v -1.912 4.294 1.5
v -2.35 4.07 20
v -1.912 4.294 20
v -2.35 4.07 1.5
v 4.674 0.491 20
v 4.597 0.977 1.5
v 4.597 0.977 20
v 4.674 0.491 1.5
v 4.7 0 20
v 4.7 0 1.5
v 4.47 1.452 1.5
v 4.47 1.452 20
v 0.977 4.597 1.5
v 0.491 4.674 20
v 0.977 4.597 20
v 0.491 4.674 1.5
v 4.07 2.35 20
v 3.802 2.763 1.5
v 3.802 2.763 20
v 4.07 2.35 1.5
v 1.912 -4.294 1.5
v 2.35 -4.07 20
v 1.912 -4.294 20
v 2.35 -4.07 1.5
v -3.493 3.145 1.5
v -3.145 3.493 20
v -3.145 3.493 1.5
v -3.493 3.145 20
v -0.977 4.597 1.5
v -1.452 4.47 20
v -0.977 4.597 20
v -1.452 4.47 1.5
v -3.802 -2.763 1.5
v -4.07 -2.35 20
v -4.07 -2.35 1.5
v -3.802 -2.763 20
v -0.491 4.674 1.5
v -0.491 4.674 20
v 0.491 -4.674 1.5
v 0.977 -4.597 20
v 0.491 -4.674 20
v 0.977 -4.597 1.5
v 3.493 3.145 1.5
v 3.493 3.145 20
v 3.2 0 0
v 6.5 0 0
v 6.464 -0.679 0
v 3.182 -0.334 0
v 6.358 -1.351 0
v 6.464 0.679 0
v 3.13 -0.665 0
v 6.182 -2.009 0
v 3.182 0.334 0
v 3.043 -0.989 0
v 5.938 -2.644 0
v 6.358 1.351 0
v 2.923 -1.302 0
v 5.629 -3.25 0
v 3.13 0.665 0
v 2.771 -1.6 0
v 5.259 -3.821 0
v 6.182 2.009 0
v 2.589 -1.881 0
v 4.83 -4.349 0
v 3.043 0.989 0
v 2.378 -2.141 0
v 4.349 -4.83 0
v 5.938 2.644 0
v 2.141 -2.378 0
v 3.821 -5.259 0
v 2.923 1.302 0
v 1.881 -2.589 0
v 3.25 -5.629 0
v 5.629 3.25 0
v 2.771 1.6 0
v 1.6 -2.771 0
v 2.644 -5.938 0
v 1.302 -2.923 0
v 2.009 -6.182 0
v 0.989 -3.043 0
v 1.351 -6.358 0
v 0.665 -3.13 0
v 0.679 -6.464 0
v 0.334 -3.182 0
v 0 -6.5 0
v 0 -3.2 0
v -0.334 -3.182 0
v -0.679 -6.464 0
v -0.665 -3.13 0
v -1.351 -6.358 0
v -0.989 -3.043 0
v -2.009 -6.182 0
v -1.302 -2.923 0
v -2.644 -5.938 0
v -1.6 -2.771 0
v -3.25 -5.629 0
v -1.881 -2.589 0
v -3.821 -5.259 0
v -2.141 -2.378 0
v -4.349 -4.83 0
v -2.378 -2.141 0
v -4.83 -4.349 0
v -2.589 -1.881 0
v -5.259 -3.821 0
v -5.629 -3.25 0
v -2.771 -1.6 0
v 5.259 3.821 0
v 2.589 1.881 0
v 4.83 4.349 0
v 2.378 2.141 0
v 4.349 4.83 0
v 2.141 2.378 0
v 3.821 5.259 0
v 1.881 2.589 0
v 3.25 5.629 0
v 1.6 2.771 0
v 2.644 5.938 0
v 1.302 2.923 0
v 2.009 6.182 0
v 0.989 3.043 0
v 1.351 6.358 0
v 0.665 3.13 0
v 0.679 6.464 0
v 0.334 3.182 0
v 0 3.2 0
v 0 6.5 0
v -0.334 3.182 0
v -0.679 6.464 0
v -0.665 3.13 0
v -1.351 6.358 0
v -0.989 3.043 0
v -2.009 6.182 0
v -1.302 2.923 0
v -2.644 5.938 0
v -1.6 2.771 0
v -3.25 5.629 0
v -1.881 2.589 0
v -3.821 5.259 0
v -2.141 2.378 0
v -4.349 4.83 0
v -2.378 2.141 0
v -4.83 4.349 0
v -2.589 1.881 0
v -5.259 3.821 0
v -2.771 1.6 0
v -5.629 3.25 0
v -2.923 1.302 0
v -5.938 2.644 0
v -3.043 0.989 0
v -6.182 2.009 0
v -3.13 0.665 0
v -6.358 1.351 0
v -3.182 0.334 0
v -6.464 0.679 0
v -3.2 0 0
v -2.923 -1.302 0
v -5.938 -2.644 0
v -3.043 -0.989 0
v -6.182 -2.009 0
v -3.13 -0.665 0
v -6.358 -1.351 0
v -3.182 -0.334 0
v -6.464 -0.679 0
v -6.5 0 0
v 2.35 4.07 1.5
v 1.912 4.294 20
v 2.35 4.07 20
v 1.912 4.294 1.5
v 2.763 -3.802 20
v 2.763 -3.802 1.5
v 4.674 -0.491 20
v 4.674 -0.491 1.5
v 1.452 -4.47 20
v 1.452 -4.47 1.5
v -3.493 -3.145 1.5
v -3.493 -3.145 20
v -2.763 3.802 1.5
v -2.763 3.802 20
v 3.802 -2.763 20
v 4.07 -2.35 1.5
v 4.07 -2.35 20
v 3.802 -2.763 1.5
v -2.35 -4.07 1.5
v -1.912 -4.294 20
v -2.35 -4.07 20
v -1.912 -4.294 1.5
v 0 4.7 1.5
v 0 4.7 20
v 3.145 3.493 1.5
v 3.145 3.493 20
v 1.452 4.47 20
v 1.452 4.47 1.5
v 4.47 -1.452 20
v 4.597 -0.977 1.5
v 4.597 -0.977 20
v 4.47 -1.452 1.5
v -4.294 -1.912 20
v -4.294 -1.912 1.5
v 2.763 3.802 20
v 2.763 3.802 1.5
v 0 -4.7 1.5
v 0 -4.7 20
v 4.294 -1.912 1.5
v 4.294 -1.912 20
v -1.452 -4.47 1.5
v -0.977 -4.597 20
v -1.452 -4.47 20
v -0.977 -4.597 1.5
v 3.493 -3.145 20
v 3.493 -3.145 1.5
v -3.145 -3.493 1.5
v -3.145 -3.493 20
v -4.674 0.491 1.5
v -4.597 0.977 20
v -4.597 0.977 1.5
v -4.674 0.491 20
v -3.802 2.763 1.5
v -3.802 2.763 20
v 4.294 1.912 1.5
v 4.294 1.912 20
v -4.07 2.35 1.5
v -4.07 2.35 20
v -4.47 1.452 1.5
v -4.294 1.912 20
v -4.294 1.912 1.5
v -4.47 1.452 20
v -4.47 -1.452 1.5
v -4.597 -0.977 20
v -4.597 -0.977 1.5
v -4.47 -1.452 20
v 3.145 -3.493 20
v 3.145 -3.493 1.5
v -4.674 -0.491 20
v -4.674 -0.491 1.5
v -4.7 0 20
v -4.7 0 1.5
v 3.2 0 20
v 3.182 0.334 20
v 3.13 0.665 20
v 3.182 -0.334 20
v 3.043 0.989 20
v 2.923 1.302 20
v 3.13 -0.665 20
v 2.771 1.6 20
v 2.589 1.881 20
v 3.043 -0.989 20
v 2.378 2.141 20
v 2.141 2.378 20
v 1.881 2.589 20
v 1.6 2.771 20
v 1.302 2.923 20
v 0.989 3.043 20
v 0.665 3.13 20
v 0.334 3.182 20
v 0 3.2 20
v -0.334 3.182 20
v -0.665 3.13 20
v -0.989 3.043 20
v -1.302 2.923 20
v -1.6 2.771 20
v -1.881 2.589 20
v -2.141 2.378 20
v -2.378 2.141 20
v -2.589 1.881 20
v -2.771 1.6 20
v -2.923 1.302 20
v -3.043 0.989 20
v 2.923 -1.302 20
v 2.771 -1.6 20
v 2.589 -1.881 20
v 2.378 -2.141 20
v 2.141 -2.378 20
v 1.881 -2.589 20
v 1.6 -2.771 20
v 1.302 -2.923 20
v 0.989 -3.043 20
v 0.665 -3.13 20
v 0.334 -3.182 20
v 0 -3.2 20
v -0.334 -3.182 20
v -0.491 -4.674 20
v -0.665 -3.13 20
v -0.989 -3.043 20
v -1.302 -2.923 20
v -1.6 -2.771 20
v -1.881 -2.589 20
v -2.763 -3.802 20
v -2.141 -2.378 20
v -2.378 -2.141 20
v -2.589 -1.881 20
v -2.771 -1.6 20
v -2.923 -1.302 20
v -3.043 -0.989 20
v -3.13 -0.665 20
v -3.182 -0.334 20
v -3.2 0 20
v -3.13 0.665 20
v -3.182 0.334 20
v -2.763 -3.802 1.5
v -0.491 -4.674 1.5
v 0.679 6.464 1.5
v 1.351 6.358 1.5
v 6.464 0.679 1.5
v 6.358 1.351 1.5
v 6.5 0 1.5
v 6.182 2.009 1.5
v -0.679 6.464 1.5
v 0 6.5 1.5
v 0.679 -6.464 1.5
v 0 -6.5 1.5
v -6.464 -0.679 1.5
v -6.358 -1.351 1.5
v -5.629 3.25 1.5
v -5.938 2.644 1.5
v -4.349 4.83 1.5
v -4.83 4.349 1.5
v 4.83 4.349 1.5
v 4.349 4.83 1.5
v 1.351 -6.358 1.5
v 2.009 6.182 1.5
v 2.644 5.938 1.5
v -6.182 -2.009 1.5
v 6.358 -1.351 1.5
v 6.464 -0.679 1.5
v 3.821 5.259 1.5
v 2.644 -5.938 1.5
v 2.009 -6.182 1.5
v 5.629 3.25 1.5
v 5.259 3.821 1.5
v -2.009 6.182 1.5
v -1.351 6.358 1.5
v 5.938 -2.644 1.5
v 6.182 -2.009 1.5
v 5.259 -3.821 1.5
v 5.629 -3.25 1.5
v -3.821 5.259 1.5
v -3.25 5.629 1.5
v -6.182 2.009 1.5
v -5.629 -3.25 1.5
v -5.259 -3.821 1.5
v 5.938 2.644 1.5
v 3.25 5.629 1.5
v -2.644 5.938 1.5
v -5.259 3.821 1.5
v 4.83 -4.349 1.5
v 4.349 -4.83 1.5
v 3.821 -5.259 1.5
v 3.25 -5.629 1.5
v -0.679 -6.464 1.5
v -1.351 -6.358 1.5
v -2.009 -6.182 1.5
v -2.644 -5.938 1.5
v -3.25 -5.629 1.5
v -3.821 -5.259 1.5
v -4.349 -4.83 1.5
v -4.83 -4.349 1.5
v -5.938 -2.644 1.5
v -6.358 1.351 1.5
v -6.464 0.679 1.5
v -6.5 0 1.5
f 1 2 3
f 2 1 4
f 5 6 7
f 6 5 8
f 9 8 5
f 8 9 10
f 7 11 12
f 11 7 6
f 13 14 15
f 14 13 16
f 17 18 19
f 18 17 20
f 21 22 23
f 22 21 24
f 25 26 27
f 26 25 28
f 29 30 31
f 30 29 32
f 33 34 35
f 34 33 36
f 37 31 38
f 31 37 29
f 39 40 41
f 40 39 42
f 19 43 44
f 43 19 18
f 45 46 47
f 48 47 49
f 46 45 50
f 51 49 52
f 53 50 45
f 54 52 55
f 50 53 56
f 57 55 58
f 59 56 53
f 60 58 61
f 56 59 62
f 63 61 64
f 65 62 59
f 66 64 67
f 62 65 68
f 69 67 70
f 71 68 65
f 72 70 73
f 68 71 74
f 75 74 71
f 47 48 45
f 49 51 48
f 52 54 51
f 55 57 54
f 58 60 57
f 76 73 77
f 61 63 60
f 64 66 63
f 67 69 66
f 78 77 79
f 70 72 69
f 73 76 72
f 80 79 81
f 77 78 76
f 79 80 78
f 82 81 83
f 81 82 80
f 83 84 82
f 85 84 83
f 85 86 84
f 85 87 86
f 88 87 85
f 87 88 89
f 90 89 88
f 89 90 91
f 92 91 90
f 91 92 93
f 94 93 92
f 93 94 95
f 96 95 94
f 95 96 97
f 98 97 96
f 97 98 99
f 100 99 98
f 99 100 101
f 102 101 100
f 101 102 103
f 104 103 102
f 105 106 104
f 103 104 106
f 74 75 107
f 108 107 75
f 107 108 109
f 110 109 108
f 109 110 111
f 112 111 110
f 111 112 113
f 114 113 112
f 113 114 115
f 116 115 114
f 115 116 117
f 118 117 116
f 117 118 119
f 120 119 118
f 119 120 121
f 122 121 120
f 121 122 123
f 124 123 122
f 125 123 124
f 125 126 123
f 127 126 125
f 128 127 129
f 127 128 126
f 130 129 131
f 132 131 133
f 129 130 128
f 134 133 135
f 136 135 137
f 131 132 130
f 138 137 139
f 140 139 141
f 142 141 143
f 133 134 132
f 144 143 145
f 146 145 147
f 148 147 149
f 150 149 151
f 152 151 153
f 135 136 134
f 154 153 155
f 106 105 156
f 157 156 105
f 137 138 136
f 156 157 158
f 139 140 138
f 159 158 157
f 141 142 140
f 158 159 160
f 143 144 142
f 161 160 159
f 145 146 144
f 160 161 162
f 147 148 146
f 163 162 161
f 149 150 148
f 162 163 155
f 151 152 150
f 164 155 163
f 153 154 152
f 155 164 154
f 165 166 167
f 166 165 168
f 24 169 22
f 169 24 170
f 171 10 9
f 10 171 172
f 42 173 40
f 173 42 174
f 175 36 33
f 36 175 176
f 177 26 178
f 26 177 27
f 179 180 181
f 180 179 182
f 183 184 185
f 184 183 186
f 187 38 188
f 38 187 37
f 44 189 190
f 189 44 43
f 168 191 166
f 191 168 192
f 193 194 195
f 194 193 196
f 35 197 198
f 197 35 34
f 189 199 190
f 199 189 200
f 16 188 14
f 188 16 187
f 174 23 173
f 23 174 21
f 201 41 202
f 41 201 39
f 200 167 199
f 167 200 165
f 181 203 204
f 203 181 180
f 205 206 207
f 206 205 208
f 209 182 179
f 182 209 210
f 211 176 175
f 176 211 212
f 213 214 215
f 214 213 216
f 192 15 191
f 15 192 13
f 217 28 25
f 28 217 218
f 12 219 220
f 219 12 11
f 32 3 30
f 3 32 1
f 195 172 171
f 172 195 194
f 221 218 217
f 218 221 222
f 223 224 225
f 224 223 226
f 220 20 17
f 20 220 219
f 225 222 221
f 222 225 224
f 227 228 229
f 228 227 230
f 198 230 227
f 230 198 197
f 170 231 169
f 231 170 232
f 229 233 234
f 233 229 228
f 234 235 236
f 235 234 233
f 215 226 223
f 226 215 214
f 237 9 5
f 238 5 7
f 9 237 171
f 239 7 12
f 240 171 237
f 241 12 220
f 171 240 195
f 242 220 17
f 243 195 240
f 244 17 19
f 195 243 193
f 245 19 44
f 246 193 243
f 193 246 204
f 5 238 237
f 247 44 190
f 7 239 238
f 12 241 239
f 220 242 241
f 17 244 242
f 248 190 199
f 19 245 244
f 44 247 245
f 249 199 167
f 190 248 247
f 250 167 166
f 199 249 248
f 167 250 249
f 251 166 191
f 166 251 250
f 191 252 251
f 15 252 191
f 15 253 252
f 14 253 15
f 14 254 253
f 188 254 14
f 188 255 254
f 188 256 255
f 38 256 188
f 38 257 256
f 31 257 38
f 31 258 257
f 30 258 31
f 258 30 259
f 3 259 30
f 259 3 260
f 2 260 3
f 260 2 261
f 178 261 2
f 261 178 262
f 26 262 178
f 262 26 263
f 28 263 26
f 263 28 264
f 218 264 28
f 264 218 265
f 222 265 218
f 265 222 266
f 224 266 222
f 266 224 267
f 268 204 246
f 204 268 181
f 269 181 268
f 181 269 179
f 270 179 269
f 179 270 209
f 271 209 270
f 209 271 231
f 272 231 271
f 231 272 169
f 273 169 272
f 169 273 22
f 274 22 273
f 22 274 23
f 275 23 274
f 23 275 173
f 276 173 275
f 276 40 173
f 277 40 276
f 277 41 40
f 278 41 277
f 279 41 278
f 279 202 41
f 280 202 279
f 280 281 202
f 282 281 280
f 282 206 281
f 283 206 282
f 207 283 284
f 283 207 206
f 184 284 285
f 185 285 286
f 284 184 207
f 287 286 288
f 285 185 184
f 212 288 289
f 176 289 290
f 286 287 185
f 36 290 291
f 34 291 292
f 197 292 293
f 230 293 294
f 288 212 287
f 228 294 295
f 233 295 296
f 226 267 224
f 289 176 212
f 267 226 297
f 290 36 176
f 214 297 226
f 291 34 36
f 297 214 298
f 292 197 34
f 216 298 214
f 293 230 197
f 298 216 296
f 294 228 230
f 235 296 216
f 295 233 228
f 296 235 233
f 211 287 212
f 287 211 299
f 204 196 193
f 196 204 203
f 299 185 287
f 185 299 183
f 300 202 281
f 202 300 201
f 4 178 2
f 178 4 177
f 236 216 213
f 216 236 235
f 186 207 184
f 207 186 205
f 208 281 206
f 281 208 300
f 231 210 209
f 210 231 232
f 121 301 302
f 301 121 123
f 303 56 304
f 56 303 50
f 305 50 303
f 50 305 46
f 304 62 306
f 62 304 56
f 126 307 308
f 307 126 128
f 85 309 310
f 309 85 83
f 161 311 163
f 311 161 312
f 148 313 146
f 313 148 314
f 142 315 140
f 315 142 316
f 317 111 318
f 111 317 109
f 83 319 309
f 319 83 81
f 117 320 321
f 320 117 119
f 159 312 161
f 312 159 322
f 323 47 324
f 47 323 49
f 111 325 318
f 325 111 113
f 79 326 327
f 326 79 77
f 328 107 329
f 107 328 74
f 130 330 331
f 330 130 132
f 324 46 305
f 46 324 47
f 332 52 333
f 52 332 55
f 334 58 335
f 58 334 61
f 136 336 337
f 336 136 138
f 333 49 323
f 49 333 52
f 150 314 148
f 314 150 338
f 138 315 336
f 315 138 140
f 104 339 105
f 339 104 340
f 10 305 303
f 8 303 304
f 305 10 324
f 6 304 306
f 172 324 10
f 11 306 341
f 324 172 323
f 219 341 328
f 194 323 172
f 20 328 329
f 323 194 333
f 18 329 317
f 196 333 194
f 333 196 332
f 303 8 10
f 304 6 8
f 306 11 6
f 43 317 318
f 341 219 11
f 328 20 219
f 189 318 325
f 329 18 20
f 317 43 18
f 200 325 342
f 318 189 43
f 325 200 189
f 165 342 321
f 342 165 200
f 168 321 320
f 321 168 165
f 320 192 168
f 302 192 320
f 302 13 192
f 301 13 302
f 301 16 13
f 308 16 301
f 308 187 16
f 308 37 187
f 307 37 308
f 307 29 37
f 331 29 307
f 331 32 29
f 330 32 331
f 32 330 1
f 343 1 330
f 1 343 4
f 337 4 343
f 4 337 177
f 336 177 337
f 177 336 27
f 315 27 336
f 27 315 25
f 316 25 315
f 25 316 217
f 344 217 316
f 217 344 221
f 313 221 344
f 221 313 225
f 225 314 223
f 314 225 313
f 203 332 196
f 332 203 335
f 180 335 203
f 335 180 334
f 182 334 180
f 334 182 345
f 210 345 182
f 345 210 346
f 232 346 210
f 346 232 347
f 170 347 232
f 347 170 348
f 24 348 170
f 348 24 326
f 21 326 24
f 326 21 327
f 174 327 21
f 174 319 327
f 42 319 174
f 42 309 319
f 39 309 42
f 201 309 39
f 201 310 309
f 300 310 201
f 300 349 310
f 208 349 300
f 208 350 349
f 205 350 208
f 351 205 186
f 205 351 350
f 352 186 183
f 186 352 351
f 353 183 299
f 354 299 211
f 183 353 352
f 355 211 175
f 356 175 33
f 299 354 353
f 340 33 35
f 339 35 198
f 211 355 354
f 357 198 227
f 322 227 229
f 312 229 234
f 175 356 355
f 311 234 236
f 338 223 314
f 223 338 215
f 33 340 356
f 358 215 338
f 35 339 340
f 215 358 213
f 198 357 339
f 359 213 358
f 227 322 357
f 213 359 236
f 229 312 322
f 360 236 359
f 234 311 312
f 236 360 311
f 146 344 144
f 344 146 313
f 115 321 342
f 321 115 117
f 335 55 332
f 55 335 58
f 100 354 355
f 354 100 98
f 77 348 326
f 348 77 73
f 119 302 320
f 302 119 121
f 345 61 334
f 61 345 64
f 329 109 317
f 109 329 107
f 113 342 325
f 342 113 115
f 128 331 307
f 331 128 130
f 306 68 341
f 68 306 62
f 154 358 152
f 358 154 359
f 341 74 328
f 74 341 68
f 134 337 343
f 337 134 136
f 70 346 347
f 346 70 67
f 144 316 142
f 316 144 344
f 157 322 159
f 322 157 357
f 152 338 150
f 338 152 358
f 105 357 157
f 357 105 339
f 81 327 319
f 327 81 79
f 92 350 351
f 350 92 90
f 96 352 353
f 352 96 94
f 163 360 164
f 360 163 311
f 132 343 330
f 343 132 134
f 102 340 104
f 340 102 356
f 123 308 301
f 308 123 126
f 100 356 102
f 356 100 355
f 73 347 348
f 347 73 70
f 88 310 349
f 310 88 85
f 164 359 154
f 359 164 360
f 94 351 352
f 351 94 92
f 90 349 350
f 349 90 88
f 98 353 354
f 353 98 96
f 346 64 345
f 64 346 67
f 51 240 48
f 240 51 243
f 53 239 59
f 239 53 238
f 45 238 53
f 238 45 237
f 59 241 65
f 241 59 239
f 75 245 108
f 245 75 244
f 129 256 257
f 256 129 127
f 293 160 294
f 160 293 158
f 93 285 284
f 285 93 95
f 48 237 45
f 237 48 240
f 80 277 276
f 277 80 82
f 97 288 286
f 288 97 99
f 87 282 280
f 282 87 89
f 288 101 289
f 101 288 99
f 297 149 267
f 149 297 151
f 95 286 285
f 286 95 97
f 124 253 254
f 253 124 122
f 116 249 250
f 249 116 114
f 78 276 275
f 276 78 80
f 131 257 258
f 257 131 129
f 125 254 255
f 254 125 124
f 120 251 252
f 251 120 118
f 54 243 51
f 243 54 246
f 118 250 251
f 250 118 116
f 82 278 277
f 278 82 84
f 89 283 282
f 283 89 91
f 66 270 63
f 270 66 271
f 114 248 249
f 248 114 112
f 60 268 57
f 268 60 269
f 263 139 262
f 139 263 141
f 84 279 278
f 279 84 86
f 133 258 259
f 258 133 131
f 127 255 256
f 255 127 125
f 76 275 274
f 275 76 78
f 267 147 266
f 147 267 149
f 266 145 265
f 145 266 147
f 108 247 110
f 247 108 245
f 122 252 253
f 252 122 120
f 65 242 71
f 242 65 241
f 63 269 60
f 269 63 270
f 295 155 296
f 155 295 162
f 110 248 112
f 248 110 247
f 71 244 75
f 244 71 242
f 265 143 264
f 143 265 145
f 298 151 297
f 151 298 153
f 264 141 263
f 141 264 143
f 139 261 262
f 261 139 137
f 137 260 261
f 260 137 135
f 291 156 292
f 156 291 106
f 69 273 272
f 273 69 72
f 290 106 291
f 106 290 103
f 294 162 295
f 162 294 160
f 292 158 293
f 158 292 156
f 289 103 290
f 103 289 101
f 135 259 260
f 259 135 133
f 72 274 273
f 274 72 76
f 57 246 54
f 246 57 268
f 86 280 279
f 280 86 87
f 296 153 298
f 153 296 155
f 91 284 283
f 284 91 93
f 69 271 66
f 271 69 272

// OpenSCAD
// Blind-rivet body.
$fn = 60;
eps = 0.02;
shank_d = 6.4;
head_d = 13;
length = 20;
difference() { union() { cylinder(d=shank_d+3,h=length); cylinder(d=max(head_d, shank_d+5),h=1.5); } translate([0,0,-eps]) cylinder(d=shank_d,h=length+2*eps); }
